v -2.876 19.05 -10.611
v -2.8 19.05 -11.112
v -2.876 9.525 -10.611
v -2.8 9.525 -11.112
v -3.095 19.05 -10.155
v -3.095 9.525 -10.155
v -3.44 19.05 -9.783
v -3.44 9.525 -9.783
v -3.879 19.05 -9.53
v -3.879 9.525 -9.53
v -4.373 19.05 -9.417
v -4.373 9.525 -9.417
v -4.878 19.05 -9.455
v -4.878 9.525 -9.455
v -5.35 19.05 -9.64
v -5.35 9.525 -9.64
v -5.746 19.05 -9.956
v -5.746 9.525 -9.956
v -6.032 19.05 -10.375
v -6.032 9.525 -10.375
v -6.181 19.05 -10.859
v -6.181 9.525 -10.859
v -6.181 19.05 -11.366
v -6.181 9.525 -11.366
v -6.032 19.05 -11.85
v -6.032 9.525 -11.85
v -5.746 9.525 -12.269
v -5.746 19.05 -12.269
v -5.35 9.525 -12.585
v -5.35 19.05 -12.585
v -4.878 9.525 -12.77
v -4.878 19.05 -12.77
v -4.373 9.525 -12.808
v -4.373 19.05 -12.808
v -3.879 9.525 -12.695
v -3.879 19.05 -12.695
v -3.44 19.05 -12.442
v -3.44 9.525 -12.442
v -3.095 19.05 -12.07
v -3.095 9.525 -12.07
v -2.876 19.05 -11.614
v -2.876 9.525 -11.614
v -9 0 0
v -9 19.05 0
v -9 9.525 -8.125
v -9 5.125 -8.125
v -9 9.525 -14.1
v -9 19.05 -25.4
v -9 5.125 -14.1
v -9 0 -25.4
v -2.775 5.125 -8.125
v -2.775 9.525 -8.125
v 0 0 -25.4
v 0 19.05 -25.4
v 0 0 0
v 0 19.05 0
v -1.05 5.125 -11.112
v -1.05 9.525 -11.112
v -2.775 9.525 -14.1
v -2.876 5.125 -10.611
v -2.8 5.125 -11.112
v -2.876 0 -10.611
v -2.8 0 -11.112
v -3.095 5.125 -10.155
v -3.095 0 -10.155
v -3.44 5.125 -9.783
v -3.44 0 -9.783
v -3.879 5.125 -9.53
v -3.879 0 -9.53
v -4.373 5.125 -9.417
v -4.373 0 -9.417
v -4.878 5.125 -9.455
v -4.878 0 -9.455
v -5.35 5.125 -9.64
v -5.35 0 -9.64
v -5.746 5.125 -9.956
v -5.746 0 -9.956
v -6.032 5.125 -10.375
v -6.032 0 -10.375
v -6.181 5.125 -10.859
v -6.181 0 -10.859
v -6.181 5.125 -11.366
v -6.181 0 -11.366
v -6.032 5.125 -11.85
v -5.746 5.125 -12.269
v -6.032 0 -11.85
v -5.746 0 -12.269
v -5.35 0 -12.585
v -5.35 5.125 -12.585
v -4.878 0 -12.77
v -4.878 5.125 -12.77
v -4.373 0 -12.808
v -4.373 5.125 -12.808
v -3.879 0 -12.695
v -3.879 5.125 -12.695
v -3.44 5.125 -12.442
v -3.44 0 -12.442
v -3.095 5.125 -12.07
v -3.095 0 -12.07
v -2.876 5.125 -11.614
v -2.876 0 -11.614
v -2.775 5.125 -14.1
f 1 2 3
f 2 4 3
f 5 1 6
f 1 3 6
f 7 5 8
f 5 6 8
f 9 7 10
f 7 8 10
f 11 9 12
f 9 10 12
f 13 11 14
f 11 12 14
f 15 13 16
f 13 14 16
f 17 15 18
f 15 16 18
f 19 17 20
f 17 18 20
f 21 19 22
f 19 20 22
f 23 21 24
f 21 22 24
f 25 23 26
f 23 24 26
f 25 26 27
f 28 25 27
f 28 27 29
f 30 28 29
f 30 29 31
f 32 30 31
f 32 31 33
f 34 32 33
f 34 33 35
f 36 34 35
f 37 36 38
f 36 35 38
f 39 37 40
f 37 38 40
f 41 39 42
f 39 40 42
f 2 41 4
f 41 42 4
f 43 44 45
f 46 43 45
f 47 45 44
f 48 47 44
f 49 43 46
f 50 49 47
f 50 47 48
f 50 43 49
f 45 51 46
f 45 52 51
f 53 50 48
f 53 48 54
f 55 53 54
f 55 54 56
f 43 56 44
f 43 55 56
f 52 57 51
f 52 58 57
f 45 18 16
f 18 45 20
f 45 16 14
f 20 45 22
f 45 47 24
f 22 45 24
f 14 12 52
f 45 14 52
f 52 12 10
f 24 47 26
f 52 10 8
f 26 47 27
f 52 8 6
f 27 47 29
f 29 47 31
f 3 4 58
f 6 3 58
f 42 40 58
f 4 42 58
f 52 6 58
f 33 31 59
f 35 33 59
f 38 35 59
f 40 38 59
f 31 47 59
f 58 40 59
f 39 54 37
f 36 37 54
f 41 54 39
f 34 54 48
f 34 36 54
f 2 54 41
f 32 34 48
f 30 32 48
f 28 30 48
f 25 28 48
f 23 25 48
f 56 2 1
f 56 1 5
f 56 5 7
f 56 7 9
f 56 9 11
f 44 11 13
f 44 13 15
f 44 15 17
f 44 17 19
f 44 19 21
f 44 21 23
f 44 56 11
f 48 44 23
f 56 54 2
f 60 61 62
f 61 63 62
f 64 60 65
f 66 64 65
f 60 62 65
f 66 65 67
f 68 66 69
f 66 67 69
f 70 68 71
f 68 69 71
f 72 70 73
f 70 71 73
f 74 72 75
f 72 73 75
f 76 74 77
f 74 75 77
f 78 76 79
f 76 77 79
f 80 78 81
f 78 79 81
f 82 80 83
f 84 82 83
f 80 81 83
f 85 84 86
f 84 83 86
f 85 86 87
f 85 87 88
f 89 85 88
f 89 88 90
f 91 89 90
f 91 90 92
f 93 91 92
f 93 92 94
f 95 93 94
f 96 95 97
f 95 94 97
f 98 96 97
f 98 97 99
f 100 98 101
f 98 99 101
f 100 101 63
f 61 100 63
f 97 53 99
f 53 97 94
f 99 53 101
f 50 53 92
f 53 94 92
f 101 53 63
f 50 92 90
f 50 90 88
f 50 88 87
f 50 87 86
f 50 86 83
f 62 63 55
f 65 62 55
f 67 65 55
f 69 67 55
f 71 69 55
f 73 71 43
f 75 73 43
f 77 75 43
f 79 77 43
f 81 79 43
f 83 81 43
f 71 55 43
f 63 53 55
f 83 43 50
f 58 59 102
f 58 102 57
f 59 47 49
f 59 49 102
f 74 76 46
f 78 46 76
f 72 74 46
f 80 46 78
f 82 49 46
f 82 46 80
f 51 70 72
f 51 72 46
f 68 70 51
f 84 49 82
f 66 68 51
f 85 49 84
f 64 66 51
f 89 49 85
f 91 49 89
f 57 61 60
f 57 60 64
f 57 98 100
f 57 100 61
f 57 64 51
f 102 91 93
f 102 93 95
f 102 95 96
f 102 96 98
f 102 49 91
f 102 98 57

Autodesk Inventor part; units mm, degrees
ref_plane "YZ Plane" through (0, 0, 0) normal (1, 0, 0) x (0, 1, 0)
ref_plane "XZ Plane" through (0, 0, 0) normal (0, 1, 0) x (-1, 0, 0)
ref_plane "XY Plane" through (0, 0, 0) normal (0, 0, 1) x (1, 0, 0)
sketch "Sketch1" plane through (0, 0, 0) normal (0, 1, 0) x (-1, 0, 0)
  line L0 (0, 0) -> (9, 0)
  line L1 (9, 0) -> (9, -25.4)
  line L2 (9, -25.4) -> (0, -25.4)
  line L3 (0, -25.4) -> (0, 0)
  dimension "d0" = 9
  dimension "d1" = 25.4
extrude "Extrusion1" add sketch "Sketch1" along normal blind 19.05
ref_plane "Work Plane1" through (0, 9.525, 0) normal (0, 1, 0) x (1, 0, 0)
sketch "Sketch2" plane through (0, 9.525, 0) normal (0, 1, 0) x (1, 0, 0)
  circle A0 centre (-4.5, 11.1125) radius 3.45 construction
  line L0 (-9, 25.4) -> (-9, 0) projected
  line L1 (-1.05, 11.1125) -> (-2.775, 8.1247)
  line L2 (-2.775, 8.1247) -> (-9, 8.1247)
  line L3 (-9, 14.1003) -> (-2.775, 14.1003)
  line L4 (-2.775, 14.1003) -> (-1.05, 11.1125)
  line L5 (-9, 8.1247) -> (-9, 14.1003)
  point P0 (0, 0)
  dimension "d4" = 6.9
  dimension "d5" = 4.5
extrude "Extrusion2" cut sketch "Sketch2" against normal blind 4.4
sketch "Sketch3" plane through (0, 0, 0) normal (0, -1, 0) x (1, 0, 0)
  line L0 (-2.775, -8.1247) -> (-9, -8.1247) construction
  line L1 (-9, -14.1003) -> (-2.775, -14.1003) construction
  line L2 (-2.775, -14.1003) -> (-1.05, -11.1125) construction
  line L3 (-1.05, -11.1125) -> (-2.775, -8.1247) construction
  circle A0 centre (-4.5, -11.1125) radius 1.7
  line L4 (-9, -25.4) -> (-9, 0) projected
  point P0 (0, 0)
  dimension "d8" = 3.4
  dimension "d9" = 4.5
extrude "Extrusion3" cut sketch "Sketch3" against normal through all
properties part number "drop in nut test"
